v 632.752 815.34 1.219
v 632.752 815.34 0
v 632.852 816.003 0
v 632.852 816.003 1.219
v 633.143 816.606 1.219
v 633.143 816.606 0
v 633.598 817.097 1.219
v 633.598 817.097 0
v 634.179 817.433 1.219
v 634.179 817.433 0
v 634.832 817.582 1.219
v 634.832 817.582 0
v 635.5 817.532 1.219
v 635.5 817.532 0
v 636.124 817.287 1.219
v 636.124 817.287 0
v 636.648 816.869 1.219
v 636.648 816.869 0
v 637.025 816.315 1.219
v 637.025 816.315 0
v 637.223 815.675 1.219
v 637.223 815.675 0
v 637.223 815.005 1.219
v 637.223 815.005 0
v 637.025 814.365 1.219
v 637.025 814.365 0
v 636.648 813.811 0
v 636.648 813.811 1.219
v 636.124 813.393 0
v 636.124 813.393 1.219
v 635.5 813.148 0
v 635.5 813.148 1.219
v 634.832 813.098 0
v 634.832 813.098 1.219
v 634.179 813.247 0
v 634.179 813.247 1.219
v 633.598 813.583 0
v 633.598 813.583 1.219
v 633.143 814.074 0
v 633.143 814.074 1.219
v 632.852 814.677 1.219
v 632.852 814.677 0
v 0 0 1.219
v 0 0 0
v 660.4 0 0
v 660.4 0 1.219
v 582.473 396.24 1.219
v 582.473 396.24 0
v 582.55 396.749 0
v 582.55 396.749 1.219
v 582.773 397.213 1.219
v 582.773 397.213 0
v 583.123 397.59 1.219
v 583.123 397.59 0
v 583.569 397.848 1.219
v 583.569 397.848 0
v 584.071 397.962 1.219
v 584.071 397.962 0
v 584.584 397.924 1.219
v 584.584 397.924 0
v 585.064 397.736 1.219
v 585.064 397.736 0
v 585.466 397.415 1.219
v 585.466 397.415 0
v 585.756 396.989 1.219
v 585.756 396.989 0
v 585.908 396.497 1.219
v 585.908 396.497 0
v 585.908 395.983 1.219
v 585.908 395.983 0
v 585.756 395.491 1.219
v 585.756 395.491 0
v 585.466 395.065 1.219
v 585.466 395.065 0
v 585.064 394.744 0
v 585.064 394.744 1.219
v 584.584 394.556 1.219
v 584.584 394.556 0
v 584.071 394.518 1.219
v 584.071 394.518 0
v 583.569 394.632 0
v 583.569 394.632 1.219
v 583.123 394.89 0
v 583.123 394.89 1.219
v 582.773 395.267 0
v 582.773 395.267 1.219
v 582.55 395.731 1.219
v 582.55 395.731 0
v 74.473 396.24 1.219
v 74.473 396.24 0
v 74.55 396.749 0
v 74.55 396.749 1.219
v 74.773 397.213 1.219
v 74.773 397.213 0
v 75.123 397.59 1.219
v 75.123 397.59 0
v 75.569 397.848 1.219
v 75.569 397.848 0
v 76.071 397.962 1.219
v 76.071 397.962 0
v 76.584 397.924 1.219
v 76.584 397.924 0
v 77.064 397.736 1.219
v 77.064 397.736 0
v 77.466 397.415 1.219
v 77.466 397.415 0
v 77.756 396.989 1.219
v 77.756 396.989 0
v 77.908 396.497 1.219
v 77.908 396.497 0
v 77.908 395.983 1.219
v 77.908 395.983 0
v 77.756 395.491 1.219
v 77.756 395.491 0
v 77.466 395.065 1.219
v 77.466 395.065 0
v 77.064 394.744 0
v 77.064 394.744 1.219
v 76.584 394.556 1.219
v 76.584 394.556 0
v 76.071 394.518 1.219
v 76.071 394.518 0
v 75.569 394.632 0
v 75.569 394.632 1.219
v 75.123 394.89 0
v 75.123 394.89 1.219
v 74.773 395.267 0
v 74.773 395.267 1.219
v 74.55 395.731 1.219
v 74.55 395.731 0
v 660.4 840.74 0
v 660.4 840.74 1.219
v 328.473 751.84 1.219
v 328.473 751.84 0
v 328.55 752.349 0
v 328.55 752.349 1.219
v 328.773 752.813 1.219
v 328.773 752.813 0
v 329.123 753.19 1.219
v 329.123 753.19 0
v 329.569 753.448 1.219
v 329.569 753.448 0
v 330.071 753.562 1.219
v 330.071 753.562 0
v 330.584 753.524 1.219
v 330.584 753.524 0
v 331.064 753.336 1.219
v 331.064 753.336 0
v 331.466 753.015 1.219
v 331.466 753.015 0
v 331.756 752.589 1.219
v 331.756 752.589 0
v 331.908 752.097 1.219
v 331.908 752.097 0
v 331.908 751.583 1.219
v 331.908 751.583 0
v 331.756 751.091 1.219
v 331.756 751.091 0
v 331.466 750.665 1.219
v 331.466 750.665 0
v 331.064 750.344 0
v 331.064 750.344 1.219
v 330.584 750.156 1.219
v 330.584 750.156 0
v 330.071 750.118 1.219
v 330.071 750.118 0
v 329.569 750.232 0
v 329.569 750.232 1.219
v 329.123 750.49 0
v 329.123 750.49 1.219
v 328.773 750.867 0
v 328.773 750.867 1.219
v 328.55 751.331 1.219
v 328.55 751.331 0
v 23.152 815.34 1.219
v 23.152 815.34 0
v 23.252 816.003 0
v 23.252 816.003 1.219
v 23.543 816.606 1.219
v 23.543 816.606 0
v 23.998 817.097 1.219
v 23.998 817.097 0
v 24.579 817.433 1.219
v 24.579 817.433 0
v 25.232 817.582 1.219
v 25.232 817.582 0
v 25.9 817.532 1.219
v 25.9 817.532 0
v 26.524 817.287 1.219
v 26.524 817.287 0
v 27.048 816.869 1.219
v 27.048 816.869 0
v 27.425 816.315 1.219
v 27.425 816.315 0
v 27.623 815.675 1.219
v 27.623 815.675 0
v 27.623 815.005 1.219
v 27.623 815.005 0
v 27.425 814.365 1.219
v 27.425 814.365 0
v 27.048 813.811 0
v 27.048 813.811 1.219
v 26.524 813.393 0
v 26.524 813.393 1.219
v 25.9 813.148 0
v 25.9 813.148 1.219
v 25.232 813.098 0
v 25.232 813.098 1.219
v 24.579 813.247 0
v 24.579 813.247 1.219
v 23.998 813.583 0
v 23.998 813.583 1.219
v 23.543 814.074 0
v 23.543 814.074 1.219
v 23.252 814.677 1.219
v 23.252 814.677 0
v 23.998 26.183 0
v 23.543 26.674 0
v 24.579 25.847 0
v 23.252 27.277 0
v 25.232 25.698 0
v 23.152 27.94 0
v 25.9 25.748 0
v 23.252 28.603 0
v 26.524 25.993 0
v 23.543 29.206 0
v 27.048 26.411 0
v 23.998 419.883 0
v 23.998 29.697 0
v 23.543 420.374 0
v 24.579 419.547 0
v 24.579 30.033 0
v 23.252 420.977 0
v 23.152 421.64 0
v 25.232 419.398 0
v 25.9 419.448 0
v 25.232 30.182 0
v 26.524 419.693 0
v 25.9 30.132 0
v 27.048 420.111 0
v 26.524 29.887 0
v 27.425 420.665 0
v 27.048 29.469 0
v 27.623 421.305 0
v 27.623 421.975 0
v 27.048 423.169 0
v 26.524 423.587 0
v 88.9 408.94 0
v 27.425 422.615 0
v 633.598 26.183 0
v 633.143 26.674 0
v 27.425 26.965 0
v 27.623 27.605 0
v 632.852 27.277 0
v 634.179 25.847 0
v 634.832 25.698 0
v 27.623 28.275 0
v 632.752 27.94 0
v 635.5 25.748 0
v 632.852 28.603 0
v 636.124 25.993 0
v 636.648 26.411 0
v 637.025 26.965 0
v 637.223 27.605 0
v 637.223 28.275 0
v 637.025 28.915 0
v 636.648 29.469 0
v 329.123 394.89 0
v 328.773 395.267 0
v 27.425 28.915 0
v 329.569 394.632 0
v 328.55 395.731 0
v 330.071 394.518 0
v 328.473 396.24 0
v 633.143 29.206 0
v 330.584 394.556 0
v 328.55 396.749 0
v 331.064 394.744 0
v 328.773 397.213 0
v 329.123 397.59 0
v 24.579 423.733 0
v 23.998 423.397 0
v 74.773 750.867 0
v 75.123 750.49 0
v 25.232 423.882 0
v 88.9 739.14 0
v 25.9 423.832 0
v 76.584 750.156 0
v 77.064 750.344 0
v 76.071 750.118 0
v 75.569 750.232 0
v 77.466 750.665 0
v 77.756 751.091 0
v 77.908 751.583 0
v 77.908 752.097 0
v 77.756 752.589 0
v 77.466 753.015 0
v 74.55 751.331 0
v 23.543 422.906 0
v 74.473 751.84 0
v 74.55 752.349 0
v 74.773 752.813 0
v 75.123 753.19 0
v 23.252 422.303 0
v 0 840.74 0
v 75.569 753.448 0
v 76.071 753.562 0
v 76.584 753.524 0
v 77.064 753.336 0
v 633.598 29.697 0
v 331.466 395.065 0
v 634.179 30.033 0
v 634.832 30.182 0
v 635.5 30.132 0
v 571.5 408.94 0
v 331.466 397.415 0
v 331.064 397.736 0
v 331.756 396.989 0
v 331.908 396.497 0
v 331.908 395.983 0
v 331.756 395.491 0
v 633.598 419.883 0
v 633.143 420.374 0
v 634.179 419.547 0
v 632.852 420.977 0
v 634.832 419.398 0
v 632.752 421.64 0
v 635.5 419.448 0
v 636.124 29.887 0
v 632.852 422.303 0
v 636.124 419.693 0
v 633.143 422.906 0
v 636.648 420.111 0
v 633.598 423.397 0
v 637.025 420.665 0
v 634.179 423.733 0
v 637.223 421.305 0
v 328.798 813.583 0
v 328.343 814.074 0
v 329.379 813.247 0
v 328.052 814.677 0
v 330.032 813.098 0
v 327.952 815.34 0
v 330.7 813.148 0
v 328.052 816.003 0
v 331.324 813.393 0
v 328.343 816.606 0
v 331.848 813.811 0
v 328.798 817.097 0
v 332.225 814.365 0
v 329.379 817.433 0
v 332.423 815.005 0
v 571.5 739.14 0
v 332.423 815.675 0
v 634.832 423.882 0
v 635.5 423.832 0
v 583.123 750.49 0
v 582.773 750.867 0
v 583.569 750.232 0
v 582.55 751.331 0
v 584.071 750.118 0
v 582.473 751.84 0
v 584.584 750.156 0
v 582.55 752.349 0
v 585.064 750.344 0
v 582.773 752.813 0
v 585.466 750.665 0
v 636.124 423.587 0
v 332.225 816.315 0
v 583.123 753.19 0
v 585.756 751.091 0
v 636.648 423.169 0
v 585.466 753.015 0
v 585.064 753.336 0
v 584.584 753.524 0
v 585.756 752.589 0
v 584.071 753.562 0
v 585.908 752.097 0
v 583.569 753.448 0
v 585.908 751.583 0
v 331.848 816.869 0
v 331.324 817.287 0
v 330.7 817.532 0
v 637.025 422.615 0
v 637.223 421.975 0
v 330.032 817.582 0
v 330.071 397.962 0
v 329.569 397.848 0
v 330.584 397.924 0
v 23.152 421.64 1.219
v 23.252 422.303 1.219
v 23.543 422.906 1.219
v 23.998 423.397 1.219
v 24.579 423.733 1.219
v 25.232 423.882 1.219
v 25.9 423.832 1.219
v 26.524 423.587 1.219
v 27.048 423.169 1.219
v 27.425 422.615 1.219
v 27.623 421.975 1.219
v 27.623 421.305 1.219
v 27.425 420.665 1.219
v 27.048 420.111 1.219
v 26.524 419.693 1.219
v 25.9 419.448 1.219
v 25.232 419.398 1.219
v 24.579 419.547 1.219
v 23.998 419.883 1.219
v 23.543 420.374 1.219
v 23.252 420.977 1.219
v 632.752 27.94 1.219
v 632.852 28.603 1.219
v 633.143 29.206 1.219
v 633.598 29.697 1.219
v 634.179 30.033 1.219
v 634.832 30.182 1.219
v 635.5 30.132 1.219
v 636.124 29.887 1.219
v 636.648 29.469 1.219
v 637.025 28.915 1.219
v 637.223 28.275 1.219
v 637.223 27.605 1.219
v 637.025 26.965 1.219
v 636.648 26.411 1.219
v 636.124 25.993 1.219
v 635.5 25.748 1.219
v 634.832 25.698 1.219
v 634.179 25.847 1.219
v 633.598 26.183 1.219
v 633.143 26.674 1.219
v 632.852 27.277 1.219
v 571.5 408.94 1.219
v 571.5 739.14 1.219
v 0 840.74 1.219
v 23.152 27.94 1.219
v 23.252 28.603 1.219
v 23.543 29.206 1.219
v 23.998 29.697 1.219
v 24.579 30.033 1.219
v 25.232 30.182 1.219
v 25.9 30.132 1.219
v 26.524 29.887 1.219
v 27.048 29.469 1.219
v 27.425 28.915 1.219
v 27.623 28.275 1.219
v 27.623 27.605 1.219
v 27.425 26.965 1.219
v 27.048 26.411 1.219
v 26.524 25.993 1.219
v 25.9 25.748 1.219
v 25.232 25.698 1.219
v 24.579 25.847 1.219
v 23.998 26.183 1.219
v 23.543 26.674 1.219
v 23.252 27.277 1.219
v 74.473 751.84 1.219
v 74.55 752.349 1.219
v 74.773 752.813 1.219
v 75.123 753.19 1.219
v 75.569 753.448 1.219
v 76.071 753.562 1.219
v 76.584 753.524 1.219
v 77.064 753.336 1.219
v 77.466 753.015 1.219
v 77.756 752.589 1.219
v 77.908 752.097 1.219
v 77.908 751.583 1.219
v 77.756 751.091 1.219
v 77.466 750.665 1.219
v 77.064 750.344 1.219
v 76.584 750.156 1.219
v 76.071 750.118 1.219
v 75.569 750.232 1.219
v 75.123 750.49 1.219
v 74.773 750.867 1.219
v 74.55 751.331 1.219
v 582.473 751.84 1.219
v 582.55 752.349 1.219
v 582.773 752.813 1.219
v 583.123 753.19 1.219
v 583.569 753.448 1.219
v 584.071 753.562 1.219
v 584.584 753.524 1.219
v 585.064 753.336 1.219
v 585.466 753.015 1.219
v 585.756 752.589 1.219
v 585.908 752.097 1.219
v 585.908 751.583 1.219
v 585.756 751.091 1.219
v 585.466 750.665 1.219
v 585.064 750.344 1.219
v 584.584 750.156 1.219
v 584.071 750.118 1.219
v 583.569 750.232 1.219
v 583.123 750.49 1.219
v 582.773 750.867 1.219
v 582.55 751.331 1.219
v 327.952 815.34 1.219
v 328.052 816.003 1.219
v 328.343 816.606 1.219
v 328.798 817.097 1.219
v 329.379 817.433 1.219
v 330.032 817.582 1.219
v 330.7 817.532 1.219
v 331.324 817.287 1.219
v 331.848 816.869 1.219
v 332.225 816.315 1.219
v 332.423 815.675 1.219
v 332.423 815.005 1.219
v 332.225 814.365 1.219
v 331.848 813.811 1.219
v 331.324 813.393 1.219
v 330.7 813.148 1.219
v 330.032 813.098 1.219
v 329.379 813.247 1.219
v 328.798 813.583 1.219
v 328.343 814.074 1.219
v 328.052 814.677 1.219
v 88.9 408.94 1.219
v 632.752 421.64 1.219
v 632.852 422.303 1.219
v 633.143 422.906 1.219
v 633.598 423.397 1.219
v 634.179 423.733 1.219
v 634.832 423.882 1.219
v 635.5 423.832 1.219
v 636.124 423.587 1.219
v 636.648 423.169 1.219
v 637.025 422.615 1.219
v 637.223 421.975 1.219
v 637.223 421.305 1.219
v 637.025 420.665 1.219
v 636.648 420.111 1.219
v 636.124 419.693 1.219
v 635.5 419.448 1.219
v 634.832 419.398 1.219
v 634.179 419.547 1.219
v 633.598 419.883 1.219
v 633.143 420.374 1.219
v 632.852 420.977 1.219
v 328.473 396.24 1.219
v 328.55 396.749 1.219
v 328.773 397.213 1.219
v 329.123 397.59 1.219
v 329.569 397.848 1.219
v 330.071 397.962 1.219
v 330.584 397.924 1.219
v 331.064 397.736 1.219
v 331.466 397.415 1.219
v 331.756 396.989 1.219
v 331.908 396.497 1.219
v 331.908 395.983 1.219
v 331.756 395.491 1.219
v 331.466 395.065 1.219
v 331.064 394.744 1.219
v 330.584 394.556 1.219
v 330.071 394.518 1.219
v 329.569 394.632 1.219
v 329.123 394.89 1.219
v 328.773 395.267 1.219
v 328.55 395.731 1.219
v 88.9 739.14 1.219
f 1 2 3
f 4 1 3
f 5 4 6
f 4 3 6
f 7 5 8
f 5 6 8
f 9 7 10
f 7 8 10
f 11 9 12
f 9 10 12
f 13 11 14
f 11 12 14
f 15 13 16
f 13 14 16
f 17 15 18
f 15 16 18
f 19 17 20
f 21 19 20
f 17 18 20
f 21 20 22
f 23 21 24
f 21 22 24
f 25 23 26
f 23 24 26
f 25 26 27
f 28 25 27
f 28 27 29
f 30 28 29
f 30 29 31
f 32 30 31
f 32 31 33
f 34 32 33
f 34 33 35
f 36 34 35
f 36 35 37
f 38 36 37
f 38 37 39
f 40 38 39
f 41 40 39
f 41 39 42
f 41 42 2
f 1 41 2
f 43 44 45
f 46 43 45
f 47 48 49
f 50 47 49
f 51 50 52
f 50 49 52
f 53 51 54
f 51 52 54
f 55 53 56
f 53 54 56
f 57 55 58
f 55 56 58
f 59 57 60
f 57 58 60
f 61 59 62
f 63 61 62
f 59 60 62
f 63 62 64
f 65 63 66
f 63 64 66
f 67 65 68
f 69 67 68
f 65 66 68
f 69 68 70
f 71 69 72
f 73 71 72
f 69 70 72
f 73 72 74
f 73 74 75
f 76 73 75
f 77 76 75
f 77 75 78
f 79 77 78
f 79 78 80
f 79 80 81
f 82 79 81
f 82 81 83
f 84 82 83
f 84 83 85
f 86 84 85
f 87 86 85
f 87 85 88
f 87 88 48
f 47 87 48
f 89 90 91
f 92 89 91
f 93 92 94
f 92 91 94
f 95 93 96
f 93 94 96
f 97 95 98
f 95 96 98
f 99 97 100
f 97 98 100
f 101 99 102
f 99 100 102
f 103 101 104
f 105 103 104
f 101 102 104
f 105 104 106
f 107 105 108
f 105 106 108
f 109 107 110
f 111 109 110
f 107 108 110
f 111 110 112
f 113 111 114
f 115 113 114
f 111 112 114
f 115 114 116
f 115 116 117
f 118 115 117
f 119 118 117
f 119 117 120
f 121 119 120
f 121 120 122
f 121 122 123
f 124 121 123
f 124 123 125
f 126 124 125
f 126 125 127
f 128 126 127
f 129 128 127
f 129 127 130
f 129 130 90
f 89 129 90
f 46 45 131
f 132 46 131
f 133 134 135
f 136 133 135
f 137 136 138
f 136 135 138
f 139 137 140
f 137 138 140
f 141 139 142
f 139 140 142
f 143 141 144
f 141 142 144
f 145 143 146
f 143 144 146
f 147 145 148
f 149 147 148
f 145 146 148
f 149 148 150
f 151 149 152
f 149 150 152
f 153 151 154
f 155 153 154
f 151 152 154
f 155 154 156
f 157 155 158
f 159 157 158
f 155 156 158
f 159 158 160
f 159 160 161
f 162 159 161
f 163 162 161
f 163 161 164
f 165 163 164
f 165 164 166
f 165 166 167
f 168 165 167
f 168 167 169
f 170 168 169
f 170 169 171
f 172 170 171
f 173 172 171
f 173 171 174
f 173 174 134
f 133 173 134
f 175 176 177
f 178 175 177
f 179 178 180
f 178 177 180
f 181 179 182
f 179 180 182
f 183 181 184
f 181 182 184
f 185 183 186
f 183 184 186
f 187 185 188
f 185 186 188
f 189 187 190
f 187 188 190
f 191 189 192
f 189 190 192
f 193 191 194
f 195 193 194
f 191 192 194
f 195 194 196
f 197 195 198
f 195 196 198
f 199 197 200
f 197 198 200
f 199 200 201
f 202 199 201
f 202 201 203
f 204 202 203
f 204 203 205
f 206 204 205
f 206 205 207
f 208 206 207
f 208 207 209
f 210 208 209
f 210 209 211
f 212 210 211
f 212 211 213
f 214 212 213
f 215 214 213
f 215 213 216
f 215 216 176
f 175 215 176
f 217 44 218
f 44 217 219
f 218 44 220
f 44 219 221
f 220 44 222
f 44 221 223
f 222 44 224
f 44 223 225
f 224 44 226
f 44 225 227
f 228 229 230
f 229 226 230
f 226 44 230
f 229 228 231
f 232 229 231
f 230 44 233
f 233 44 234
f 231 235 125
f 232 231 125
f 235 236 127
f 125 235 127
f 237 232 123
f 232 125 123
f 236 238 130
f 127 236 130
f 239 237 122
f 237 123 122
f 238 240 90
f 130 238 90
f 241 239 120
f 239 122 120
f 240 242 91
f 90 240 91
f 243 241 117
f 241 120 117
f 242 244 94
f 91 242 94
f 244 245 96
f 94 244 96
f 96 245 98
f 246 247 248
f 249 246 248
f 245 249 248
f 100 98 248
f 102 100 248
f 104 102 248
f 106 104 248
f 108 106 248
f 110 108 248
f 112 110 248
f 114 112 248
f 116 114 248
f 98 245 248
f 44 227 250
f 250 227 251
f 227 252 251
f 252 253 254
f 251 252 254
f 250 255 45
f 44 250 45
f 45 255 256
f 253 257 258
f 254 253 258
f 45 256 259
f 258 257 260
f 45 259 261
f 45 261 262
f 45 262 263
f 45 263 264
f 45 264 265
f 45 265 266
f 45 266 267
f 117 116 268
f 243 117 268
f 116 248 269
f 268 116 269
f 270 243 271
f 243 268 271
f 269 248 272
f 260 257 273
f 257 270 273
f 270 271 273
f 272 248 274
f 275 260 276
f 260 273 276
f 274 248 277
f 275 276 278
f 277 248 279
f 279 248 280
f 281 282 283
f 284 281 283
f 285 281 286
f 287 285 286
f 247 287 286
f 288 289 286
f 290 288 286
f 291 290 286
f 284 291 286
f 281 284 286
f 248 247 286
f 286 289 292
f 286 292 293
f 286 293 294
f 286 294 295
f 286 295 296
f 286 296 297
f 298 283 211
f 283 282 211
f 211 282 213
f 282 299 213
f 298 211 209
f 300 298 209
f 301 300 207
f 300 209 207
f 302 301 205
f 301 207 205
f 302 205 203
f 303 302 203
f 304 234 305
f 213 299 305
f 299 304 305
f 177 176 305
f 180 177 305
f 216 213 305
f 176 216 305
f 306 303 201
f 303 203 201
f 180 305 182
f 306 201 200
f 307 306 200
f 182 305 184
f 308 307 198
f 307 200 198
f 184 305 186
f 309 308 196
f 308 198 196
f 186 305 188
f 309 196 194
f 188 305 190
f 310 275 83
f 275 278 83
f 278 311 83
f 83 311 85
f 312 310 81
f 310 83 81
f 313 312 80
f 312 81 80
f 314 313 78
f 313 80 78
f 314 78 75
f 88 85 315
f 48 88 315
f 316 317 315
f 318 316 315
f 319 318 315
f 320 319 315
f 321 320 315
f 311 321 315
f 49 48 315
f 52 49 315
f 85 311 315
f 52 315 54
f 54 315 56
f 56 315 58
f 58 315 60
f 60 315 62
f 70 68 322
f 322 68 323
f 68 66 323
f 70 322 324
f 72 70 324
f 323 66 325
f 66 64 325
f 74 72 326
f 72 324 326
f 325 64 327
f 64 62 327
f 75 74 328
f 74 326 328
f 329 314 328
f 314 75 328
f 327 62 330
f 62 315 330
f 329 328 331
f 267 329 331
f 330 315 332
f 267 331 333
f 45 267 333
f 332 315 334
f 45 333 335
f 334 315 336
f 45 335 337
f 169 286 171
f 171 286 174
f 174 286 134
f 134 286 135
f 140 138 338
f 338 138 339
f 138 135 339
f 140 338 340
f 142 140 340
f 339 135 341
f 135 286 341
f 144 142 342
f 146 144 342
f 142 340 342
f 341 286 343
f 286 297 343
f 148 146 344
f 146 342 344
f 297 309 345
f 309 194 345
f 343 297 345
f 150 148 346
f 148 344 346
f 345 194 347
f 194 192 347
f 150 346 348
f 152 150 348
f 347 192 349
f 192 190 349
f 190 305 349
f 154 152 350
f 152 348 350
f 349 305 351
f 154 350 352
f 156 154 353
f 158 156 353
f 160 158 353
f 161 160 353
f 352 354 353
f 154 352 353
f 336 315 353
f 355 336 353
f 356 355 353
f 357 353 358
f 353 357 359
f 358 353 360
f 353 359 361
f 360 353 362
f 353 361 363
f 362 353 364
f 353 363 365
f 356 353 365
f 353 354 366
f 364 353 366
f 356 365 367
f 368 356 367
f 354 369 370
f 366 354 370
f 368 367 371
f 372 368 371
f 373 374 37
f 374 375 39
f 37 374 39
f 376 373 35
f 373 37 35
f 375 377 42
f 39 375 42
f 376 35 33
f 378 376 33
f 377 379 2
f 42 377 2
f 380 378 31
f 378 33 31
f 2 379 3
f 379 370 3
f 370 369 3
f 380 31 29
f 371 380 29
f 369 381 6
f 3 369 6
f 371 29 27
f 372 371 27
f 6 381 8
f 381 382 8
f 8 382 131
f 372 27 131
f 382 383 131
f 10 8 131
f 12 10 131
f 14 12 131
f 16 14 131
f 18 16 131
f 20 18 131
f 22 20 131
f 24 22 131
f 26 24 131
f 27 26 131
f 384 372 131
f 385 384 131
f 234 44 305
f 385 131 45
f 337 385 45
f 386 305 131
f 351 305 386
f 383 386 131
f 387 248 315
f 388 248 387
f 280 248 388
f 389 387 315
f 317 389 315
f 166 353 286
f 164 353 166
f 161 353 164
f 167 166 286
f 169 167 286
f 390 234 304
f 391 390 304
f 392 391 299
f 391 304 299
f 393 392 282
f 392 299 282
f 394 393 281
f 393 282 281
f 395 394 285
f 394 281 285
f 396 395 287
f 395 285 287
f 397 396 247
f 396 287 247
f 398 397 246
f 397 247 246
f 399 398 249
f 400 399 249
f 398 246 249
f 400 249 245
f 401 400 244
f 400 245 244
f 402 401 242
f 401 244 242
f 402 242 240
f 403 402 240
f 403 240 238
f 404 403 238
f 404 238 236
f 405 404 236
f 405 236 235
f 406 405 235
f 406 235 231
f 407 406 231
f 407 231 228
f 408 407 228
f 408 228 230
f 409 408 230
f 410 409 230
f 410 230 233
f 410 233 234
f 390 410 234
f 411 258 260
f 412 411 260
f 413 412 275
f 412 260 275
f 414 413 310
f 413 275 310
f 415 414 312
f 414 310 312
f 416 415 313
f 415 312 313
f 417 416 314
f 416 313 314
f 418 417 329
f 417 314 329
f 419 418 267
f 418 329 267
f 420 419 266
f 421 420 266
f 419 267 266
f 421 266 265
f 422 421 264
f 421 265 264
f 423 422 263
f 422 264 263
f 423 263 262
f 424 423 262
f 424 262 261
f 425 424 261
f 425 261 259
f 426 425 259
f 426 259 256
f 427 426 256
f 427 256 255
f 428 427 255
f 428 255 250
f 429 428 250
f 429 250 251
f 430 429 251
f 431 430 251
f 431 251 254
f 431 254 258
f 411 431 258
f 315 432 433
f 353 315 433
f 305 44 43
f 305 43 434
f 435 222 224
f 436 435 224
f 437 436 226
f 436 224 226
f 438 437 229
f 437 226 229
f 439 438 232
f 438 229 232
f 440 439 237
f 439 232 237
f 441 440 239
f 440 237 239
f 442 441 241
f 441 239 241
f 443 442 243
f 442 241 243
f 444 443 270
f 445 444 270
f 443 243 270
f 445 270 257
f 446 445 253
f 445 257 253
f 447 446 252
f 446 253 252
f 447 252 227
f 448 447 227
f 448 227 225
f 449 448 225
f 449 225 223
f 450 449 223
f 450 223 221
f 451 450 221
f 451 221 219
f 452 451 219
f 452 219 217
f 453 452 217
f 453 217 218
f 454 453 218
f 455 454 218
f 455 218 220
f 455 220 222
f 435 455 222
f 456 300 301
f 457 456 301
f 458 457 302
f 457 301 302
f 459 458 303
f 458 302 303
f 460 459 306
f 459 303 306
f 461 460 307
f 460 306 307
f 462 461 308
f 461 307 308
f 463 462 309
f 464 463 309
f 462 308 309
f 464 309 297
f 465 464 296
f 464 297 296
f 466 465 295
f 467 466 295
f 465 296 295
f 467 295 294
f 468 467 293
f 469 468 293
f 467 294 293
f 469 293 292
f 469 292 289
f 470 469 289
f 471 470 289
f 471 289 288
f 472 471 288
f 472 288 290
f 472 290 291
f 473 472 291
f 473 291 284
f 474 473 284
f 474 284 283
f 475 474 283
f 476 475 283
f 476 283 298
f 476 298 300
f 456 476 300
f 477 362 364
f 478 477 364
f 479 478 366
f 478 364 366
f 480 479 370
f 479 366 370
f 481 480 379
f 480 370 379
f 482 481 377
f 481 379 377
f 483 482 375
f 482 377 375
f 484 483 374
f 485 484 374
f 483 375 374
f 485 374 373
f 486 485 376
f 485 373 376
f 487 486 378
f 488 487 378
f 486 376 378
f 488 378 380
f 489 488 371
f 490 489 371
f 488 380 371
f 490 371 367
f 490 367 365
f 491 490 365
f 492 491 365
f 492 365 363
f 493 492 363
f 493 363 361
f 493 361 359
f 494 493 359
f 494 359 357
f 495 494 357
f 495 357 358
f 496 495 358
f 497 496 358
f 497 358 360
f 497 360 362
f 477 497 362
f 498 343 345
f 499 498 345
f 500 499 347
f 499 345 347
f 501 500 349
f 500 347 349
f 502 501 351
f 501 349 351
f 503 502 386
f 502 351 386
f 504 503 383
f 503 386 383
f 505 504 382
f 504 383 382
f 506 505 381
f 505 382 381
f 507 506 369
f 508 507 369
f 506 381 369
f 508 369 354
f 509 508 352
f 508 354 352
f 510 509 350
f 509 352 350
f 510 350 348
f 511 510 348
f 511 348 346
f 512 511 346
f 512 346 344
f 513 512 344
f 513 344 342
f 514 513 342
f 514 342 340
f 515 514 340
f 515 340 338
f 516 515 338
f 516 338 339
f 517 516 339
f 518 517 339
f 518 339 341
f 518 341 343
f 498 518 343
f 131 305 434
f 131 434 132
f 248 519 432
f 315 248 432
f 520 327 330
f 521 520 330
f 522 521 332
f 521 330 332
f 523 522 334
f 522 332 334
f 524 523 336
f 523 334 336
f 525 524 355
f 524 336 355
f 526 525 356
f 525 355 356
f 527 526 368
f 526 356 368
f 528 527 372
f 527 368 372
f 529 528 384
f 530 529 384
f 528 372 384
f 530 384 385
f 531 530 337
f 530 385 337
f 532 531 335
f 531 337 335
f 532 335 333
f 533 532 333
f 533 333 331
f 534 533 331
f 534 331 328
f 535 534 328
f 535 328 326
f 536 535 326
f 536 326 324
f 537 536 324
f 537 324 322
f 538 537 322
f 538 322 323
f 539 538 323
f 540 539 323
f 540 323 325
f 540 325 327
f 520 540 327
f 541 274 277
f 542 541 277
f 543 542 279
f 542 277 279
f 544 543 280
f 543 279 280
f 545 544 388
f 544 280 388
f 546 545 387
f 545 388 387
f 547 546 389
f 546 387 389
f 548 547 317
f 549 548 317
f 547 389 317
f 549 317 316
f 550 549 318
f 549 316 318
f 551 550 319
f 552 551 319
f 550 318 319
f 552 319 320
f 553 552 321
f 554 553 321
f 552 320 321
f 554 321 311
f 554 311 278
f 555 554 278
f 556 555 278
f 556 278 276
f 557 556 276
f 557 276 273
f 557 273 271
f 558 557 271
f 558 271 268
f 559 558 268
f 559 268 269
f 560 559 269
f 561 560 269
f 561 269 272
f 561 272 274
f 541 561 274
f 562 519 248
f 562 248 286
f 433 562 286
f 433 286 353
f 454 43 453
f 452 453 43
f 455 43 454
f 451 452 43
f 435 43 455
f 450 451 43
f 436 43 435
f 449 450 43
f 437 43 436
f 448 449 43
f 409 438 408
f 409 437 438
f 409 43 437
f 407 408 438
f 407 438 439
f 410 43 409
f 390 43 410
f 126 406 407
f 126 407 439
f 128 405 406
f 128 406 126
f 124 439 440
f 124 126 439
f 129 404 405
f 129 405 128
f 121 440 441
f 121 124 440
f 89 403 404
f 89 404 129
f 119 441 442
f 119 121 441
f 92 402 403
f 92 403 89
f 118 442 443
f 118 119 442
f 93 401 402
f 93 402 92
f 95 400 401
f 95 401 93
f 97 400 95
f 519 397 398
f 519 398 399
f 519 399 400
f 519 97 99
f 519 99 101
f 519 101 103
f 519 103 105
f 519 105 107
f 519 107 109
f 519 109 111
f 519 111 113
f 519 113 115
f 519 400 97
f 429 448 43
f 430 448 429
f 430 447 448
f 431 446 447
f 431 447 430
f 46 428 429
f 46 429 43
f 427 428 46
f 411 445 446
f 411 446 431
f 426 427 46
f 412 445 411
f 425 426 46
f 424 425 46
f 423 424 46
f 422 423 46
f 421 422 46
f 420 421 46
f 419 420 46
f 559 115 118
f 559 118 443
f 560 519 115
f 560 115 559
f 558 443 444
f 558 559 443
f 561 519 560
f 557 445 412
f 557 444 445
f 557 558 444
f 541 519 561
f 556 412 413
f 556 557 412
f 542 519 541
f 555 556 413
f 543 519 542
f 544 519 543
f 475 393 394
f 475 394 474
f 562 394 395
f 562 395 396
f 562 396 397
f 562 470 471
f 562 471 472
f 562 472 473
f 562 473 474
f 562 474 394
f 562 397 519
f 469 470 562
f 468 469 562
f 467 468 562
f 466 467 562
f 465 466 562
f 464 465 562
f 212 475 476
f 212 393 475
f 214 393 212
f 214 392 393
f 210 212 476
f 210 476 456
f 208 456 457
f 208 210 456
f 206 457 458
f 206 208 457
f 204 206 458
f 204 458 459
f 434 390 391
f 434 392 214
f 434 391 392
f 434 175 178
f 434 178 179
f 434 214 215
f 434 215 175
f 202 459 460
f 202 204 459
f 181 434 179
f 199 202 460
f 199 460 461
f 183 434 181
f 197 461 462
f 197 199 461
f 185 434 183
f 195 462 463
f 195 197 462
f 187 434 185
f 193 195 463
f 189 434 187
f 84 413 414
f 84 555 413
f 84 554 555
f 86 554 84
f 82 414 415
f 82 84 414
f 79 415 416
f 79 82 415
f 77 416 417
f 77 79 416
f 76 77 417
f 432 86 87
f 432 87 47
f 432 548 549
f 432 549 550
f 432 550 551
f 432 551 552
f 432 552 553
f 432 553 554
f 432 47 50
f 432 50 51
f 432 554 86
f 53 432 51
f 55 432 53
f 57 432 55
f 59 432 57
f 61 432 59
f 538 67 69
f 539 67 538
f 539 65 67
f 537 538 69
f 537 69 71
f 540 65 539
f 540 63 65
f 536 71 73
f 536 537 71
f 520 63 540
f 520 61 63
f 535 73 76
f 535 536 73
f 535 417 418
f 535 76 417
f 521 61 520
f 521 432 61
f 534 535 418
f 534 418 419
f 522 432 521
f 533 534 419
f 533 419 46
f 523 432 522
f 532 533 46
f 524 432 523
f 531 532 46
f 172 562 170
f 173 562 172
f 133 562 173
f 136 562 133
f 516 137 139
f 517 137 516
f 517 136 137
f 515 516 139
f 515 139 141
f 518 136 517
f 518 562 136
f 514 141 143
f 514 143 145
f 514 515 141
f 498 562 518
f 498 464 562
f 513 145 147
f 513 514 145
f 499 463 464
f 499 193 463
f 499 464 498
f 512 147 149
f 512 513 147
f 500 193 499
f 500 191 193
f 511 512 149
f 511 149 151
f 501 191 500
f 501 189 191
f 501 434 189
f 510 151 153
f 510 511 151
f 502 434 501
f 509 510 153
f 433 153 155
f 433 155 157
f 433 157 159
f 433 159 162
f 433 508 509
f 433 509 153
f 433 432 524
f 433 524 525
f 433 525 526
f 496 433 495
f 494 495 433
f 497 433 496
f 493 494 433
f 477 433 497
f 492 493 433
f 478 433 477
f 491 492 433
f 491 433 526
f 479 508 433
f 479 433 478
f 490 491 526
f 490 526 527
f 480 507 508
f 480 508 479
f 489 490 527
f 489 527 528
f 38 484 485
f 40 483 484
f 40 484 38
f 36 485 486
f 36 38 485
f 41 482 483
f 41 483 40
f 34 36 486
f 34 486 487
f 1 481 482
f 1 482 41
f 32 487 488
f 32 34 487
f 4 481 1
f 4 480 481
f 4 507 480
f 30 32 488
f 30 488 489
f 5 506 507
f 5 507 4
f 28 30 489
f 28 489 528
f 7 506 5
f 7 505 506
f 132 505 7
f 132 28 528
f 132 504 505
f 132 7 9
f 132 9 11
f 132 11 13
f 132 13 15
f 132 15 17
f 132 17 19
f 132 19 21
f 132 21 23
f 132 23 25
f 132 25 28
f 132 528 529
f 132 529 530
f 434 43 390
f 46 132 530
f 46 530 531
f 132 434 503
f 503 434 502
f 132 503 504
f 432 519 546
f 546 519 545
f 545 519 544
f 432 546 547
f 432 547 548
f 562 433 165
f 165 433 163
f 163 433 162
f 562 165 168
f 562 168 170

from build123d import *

# Parameters (mm, degrees)
SKETCH1_W                     = 660.4
SKETCH1_H                     = 840.74
BOSS_EXTRUDE1_DEPTH           = 1.2192
F_8_CLEARANCE_HOLE1_D         = 4.4958
SKETCH5_W                     = 482.6
SKETCH5_H                     = 330.2
CUT_EXTRUDE1_DEPTH            = 2.54
TAP_DRILL_FOR_8_32_TAP1_D     = 3.4544
TAP_DRILL_FOR_8_32_TAP1_DEPTH = 25.4
TAP_DRILL_FOR_8_32_TAP1_TIP   = 1.037806461


with BuildPart() as part:
    # Sketch1 → Boss-Extrude1 (new body)
    with BuildSketch(Plane.XY):
        with Locations((330.2, 420.37)):
            Rectangle(SKETCH1_W, SKETCH1_H)
    extrude(amount=BOSS_EXTRUDE1_DEPTH)

    # #8 Clearance Hole1 (through all)
    with Locations(Plane.XY.offset(1.2192)):
        with Locations((25.4, 815.34), (330.2, 815.34), (635, 815.34), (25.4, 421.64), (25.4, 27.94), (635, 27.94), (635, 421.64)):
            Hole(F_8_CLEARANCE_HOLE1_D / 2)

    # Sketch5 → Cut-Extrude1 (cut)
    with BuildSketch(Plane.XY.offset(1.2192)):
        with Locations((330.2, 574.04)):
            Rectangle(SKETCH5_W, SKETCH5_H)
    extrude(amount=-CUT_EXTRUDE1_DEPTH, mode=Mode.SUBTRACT)

    # Tap Drill for #8-32 Tap1
    with Locations(Plane.XY.offset(1.2192)):
        with Locations((76.2, 751.84), (330.2, 751.84), (584.2, 751.84), (584.2, 396.24), (330.2, 396.24), (76.2, 396.24)):
            Hole(TAP_DRILL_FOR_8_32_TAP1_D / 2, depth=TAP_DRILL_FOR_8_32_TAP1_DEPTH)
            with Locations((0, 0, -(TAP_DRILL_FOR_8_32_TAP1_DEPTH + TAP_DRILL_FOR_8_32_TAP1_TIP / 2))):  # 118° drill point
                Cone(0, TAP_DRILL_FOR_8_32_TAP1_D / 2, TAP_DRILL_FOR_8_32_TAP1_TIP, mode=Mode.SUBTRACT)


solid = part.part
